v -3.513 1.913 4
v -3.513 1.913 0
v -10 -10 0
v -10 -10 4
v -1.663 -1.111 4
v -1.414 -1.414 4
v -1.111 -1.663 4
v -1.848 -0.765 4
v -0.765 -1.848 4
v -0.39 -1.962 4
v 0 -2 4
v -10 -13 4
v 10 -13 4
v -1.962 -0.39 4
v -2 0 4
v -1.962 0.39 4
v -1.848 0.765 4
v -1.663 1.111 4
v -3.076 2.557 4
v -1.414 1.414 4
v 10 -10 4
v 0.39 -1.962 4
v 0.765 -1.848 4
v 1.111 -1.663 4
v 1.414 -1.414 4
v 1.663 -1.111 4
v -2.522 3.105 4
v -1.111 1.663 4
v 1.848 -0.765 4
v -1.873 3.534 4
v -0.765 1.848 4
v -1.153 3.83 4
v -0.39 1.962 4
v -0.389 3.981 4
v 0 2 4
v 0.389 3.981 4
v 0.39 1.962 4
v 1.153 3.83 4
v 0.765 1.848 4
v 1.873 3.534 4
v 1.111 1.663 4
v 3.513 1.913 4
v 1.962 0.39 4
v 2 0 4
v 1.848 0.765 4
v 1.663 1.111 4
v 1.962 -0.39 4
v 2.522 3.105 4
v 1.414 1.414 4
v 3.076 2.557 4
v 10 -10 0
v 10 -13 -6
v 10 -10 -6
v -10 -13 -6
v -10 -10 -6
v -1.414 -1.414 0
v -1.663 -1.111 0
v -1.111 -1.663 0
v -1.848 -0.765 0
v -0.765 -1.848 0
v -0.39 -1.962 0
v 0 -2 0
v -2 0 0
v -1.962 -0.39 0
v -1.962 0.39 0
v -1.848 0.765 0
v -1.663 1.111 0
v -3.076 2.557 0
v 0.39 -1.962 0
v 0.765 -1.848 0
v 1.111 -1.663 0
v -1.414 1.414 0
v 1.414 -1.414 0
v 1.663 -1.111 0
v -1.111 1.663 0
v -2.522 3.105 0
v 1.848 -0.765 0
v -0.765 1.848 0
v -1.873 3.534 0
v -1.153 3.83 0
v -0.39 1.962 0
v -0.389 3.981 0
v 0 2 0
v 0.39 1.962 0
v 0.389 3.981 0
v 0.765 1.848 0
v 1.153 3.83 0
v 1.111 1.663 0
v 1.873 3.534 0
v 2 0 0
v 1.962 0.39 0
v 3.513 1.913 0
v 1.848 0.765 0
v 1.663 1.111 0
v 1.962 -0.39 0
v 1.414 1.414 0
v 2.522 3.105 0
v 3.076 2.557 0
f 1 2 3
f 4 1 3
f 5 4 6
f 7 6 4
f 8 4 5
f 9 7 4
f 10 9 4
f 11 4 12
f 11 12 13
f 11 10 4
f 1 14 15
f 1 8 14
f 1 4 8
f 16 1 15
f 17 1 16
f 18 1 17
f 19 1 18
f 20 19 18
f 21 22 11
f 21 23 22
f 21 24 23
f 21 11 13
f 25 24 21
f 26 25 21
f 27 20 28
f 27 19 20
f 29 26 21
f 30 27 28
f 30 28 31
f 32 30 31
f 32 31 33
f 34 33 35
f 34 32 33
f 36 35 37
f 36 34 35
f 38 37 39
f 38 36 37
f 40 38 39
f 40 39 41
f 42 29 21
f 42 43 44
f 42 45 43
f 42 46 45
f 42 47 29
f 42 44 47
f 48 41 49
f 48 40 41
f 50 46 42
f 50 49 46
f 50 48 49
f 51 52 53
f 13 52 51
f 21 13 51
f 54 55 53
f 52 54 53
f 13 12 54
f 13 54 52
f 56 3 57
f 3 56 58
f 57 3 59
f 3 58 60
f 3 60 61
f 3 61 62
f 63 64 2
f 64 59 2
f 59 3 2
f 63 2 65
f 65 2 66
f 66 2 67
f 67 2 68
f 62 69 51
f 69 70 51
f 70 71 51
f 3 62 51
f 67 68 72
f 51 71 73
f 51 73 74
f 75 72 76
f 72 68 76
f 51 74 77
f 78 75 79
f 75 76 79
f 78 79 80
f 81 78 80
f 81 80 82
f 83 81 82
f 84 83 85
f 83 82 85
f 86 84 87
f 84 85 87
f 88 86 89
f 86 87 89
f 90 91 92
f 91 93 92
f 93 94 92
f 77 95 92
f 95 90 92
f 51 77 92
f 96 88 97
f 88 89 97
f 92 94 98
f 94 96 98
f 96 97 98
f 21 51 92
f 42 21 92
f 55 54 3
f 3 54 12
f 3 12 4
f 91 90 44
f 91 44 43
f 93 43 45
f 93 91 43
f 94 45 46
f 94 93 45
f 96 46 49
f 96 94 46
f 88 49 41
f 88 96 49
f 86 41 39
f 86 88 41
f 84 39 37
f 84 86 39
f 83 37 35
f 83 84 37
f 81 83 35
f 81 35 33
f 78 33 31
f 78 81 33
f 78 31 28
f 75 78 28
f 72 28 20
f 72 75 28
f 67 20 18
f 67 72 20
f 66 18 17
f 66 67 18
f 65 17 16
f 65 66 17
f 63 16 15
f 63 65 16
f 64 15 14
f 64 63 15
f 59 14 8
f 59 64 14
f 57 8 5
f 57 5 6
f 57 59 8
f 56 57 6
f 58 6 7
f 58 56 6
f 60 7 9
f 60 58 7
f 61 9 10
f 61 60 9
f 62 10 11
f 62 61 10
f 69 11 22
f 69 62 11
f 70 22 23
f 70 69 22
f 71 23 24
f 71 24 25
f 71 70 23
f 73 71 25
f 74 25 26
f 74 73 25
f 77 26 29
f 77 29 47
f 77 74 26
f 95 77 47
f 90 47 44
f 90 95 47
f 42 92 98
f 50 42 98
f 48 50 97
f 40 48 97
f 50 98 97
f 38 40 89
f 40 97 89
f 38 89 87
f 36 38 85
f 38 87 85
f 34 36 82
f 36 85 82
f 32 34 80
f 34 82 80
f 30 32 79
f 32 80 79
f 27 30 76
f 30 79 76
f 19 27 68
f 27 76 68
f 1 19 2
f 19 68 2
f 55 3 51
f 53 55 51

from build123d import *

# Parameters (mm, degrees)
SKETCH_1_R      = 2
EXTRUDE_1_DEPTH = 4
SKETCH_2_W      = 20
SKETCH_2_H      = 3
EXTRUDE_2_DEPTH = 10


with BuildPart() as part:
    # 草图1 → 凸台-拉伸1 (new body)
    with BuildSketch(Plane.XY):
        with BuildLine():
            Line((-10, -10), (10, -10))
            Line((10, -10), (3.512931993, 1.912931993))
            ThreePointArc((3.512931993, 1.912931993), (0, 4), (-3.512931993, 1.912931993))
            Line((-3.512931993, 1.912931993), (-10, -10))
        make_face()
        Circle(SKETCH_1_R, mode=Mode.SUBTRACT)
    extrude(amount=EXTRUDE_1_DEPTH)

    # 草图2 → 凸台-拉伸2 (add)
    with BuildSketch(Plane.XY.offset(4)):
        with Locations((0, -11.5)):
            Rectangle(SKETCH_2_W, SKETCH_2_H)
    extrude(amount=-EXTRUDE_2_DEPTH)


solid = part.part
